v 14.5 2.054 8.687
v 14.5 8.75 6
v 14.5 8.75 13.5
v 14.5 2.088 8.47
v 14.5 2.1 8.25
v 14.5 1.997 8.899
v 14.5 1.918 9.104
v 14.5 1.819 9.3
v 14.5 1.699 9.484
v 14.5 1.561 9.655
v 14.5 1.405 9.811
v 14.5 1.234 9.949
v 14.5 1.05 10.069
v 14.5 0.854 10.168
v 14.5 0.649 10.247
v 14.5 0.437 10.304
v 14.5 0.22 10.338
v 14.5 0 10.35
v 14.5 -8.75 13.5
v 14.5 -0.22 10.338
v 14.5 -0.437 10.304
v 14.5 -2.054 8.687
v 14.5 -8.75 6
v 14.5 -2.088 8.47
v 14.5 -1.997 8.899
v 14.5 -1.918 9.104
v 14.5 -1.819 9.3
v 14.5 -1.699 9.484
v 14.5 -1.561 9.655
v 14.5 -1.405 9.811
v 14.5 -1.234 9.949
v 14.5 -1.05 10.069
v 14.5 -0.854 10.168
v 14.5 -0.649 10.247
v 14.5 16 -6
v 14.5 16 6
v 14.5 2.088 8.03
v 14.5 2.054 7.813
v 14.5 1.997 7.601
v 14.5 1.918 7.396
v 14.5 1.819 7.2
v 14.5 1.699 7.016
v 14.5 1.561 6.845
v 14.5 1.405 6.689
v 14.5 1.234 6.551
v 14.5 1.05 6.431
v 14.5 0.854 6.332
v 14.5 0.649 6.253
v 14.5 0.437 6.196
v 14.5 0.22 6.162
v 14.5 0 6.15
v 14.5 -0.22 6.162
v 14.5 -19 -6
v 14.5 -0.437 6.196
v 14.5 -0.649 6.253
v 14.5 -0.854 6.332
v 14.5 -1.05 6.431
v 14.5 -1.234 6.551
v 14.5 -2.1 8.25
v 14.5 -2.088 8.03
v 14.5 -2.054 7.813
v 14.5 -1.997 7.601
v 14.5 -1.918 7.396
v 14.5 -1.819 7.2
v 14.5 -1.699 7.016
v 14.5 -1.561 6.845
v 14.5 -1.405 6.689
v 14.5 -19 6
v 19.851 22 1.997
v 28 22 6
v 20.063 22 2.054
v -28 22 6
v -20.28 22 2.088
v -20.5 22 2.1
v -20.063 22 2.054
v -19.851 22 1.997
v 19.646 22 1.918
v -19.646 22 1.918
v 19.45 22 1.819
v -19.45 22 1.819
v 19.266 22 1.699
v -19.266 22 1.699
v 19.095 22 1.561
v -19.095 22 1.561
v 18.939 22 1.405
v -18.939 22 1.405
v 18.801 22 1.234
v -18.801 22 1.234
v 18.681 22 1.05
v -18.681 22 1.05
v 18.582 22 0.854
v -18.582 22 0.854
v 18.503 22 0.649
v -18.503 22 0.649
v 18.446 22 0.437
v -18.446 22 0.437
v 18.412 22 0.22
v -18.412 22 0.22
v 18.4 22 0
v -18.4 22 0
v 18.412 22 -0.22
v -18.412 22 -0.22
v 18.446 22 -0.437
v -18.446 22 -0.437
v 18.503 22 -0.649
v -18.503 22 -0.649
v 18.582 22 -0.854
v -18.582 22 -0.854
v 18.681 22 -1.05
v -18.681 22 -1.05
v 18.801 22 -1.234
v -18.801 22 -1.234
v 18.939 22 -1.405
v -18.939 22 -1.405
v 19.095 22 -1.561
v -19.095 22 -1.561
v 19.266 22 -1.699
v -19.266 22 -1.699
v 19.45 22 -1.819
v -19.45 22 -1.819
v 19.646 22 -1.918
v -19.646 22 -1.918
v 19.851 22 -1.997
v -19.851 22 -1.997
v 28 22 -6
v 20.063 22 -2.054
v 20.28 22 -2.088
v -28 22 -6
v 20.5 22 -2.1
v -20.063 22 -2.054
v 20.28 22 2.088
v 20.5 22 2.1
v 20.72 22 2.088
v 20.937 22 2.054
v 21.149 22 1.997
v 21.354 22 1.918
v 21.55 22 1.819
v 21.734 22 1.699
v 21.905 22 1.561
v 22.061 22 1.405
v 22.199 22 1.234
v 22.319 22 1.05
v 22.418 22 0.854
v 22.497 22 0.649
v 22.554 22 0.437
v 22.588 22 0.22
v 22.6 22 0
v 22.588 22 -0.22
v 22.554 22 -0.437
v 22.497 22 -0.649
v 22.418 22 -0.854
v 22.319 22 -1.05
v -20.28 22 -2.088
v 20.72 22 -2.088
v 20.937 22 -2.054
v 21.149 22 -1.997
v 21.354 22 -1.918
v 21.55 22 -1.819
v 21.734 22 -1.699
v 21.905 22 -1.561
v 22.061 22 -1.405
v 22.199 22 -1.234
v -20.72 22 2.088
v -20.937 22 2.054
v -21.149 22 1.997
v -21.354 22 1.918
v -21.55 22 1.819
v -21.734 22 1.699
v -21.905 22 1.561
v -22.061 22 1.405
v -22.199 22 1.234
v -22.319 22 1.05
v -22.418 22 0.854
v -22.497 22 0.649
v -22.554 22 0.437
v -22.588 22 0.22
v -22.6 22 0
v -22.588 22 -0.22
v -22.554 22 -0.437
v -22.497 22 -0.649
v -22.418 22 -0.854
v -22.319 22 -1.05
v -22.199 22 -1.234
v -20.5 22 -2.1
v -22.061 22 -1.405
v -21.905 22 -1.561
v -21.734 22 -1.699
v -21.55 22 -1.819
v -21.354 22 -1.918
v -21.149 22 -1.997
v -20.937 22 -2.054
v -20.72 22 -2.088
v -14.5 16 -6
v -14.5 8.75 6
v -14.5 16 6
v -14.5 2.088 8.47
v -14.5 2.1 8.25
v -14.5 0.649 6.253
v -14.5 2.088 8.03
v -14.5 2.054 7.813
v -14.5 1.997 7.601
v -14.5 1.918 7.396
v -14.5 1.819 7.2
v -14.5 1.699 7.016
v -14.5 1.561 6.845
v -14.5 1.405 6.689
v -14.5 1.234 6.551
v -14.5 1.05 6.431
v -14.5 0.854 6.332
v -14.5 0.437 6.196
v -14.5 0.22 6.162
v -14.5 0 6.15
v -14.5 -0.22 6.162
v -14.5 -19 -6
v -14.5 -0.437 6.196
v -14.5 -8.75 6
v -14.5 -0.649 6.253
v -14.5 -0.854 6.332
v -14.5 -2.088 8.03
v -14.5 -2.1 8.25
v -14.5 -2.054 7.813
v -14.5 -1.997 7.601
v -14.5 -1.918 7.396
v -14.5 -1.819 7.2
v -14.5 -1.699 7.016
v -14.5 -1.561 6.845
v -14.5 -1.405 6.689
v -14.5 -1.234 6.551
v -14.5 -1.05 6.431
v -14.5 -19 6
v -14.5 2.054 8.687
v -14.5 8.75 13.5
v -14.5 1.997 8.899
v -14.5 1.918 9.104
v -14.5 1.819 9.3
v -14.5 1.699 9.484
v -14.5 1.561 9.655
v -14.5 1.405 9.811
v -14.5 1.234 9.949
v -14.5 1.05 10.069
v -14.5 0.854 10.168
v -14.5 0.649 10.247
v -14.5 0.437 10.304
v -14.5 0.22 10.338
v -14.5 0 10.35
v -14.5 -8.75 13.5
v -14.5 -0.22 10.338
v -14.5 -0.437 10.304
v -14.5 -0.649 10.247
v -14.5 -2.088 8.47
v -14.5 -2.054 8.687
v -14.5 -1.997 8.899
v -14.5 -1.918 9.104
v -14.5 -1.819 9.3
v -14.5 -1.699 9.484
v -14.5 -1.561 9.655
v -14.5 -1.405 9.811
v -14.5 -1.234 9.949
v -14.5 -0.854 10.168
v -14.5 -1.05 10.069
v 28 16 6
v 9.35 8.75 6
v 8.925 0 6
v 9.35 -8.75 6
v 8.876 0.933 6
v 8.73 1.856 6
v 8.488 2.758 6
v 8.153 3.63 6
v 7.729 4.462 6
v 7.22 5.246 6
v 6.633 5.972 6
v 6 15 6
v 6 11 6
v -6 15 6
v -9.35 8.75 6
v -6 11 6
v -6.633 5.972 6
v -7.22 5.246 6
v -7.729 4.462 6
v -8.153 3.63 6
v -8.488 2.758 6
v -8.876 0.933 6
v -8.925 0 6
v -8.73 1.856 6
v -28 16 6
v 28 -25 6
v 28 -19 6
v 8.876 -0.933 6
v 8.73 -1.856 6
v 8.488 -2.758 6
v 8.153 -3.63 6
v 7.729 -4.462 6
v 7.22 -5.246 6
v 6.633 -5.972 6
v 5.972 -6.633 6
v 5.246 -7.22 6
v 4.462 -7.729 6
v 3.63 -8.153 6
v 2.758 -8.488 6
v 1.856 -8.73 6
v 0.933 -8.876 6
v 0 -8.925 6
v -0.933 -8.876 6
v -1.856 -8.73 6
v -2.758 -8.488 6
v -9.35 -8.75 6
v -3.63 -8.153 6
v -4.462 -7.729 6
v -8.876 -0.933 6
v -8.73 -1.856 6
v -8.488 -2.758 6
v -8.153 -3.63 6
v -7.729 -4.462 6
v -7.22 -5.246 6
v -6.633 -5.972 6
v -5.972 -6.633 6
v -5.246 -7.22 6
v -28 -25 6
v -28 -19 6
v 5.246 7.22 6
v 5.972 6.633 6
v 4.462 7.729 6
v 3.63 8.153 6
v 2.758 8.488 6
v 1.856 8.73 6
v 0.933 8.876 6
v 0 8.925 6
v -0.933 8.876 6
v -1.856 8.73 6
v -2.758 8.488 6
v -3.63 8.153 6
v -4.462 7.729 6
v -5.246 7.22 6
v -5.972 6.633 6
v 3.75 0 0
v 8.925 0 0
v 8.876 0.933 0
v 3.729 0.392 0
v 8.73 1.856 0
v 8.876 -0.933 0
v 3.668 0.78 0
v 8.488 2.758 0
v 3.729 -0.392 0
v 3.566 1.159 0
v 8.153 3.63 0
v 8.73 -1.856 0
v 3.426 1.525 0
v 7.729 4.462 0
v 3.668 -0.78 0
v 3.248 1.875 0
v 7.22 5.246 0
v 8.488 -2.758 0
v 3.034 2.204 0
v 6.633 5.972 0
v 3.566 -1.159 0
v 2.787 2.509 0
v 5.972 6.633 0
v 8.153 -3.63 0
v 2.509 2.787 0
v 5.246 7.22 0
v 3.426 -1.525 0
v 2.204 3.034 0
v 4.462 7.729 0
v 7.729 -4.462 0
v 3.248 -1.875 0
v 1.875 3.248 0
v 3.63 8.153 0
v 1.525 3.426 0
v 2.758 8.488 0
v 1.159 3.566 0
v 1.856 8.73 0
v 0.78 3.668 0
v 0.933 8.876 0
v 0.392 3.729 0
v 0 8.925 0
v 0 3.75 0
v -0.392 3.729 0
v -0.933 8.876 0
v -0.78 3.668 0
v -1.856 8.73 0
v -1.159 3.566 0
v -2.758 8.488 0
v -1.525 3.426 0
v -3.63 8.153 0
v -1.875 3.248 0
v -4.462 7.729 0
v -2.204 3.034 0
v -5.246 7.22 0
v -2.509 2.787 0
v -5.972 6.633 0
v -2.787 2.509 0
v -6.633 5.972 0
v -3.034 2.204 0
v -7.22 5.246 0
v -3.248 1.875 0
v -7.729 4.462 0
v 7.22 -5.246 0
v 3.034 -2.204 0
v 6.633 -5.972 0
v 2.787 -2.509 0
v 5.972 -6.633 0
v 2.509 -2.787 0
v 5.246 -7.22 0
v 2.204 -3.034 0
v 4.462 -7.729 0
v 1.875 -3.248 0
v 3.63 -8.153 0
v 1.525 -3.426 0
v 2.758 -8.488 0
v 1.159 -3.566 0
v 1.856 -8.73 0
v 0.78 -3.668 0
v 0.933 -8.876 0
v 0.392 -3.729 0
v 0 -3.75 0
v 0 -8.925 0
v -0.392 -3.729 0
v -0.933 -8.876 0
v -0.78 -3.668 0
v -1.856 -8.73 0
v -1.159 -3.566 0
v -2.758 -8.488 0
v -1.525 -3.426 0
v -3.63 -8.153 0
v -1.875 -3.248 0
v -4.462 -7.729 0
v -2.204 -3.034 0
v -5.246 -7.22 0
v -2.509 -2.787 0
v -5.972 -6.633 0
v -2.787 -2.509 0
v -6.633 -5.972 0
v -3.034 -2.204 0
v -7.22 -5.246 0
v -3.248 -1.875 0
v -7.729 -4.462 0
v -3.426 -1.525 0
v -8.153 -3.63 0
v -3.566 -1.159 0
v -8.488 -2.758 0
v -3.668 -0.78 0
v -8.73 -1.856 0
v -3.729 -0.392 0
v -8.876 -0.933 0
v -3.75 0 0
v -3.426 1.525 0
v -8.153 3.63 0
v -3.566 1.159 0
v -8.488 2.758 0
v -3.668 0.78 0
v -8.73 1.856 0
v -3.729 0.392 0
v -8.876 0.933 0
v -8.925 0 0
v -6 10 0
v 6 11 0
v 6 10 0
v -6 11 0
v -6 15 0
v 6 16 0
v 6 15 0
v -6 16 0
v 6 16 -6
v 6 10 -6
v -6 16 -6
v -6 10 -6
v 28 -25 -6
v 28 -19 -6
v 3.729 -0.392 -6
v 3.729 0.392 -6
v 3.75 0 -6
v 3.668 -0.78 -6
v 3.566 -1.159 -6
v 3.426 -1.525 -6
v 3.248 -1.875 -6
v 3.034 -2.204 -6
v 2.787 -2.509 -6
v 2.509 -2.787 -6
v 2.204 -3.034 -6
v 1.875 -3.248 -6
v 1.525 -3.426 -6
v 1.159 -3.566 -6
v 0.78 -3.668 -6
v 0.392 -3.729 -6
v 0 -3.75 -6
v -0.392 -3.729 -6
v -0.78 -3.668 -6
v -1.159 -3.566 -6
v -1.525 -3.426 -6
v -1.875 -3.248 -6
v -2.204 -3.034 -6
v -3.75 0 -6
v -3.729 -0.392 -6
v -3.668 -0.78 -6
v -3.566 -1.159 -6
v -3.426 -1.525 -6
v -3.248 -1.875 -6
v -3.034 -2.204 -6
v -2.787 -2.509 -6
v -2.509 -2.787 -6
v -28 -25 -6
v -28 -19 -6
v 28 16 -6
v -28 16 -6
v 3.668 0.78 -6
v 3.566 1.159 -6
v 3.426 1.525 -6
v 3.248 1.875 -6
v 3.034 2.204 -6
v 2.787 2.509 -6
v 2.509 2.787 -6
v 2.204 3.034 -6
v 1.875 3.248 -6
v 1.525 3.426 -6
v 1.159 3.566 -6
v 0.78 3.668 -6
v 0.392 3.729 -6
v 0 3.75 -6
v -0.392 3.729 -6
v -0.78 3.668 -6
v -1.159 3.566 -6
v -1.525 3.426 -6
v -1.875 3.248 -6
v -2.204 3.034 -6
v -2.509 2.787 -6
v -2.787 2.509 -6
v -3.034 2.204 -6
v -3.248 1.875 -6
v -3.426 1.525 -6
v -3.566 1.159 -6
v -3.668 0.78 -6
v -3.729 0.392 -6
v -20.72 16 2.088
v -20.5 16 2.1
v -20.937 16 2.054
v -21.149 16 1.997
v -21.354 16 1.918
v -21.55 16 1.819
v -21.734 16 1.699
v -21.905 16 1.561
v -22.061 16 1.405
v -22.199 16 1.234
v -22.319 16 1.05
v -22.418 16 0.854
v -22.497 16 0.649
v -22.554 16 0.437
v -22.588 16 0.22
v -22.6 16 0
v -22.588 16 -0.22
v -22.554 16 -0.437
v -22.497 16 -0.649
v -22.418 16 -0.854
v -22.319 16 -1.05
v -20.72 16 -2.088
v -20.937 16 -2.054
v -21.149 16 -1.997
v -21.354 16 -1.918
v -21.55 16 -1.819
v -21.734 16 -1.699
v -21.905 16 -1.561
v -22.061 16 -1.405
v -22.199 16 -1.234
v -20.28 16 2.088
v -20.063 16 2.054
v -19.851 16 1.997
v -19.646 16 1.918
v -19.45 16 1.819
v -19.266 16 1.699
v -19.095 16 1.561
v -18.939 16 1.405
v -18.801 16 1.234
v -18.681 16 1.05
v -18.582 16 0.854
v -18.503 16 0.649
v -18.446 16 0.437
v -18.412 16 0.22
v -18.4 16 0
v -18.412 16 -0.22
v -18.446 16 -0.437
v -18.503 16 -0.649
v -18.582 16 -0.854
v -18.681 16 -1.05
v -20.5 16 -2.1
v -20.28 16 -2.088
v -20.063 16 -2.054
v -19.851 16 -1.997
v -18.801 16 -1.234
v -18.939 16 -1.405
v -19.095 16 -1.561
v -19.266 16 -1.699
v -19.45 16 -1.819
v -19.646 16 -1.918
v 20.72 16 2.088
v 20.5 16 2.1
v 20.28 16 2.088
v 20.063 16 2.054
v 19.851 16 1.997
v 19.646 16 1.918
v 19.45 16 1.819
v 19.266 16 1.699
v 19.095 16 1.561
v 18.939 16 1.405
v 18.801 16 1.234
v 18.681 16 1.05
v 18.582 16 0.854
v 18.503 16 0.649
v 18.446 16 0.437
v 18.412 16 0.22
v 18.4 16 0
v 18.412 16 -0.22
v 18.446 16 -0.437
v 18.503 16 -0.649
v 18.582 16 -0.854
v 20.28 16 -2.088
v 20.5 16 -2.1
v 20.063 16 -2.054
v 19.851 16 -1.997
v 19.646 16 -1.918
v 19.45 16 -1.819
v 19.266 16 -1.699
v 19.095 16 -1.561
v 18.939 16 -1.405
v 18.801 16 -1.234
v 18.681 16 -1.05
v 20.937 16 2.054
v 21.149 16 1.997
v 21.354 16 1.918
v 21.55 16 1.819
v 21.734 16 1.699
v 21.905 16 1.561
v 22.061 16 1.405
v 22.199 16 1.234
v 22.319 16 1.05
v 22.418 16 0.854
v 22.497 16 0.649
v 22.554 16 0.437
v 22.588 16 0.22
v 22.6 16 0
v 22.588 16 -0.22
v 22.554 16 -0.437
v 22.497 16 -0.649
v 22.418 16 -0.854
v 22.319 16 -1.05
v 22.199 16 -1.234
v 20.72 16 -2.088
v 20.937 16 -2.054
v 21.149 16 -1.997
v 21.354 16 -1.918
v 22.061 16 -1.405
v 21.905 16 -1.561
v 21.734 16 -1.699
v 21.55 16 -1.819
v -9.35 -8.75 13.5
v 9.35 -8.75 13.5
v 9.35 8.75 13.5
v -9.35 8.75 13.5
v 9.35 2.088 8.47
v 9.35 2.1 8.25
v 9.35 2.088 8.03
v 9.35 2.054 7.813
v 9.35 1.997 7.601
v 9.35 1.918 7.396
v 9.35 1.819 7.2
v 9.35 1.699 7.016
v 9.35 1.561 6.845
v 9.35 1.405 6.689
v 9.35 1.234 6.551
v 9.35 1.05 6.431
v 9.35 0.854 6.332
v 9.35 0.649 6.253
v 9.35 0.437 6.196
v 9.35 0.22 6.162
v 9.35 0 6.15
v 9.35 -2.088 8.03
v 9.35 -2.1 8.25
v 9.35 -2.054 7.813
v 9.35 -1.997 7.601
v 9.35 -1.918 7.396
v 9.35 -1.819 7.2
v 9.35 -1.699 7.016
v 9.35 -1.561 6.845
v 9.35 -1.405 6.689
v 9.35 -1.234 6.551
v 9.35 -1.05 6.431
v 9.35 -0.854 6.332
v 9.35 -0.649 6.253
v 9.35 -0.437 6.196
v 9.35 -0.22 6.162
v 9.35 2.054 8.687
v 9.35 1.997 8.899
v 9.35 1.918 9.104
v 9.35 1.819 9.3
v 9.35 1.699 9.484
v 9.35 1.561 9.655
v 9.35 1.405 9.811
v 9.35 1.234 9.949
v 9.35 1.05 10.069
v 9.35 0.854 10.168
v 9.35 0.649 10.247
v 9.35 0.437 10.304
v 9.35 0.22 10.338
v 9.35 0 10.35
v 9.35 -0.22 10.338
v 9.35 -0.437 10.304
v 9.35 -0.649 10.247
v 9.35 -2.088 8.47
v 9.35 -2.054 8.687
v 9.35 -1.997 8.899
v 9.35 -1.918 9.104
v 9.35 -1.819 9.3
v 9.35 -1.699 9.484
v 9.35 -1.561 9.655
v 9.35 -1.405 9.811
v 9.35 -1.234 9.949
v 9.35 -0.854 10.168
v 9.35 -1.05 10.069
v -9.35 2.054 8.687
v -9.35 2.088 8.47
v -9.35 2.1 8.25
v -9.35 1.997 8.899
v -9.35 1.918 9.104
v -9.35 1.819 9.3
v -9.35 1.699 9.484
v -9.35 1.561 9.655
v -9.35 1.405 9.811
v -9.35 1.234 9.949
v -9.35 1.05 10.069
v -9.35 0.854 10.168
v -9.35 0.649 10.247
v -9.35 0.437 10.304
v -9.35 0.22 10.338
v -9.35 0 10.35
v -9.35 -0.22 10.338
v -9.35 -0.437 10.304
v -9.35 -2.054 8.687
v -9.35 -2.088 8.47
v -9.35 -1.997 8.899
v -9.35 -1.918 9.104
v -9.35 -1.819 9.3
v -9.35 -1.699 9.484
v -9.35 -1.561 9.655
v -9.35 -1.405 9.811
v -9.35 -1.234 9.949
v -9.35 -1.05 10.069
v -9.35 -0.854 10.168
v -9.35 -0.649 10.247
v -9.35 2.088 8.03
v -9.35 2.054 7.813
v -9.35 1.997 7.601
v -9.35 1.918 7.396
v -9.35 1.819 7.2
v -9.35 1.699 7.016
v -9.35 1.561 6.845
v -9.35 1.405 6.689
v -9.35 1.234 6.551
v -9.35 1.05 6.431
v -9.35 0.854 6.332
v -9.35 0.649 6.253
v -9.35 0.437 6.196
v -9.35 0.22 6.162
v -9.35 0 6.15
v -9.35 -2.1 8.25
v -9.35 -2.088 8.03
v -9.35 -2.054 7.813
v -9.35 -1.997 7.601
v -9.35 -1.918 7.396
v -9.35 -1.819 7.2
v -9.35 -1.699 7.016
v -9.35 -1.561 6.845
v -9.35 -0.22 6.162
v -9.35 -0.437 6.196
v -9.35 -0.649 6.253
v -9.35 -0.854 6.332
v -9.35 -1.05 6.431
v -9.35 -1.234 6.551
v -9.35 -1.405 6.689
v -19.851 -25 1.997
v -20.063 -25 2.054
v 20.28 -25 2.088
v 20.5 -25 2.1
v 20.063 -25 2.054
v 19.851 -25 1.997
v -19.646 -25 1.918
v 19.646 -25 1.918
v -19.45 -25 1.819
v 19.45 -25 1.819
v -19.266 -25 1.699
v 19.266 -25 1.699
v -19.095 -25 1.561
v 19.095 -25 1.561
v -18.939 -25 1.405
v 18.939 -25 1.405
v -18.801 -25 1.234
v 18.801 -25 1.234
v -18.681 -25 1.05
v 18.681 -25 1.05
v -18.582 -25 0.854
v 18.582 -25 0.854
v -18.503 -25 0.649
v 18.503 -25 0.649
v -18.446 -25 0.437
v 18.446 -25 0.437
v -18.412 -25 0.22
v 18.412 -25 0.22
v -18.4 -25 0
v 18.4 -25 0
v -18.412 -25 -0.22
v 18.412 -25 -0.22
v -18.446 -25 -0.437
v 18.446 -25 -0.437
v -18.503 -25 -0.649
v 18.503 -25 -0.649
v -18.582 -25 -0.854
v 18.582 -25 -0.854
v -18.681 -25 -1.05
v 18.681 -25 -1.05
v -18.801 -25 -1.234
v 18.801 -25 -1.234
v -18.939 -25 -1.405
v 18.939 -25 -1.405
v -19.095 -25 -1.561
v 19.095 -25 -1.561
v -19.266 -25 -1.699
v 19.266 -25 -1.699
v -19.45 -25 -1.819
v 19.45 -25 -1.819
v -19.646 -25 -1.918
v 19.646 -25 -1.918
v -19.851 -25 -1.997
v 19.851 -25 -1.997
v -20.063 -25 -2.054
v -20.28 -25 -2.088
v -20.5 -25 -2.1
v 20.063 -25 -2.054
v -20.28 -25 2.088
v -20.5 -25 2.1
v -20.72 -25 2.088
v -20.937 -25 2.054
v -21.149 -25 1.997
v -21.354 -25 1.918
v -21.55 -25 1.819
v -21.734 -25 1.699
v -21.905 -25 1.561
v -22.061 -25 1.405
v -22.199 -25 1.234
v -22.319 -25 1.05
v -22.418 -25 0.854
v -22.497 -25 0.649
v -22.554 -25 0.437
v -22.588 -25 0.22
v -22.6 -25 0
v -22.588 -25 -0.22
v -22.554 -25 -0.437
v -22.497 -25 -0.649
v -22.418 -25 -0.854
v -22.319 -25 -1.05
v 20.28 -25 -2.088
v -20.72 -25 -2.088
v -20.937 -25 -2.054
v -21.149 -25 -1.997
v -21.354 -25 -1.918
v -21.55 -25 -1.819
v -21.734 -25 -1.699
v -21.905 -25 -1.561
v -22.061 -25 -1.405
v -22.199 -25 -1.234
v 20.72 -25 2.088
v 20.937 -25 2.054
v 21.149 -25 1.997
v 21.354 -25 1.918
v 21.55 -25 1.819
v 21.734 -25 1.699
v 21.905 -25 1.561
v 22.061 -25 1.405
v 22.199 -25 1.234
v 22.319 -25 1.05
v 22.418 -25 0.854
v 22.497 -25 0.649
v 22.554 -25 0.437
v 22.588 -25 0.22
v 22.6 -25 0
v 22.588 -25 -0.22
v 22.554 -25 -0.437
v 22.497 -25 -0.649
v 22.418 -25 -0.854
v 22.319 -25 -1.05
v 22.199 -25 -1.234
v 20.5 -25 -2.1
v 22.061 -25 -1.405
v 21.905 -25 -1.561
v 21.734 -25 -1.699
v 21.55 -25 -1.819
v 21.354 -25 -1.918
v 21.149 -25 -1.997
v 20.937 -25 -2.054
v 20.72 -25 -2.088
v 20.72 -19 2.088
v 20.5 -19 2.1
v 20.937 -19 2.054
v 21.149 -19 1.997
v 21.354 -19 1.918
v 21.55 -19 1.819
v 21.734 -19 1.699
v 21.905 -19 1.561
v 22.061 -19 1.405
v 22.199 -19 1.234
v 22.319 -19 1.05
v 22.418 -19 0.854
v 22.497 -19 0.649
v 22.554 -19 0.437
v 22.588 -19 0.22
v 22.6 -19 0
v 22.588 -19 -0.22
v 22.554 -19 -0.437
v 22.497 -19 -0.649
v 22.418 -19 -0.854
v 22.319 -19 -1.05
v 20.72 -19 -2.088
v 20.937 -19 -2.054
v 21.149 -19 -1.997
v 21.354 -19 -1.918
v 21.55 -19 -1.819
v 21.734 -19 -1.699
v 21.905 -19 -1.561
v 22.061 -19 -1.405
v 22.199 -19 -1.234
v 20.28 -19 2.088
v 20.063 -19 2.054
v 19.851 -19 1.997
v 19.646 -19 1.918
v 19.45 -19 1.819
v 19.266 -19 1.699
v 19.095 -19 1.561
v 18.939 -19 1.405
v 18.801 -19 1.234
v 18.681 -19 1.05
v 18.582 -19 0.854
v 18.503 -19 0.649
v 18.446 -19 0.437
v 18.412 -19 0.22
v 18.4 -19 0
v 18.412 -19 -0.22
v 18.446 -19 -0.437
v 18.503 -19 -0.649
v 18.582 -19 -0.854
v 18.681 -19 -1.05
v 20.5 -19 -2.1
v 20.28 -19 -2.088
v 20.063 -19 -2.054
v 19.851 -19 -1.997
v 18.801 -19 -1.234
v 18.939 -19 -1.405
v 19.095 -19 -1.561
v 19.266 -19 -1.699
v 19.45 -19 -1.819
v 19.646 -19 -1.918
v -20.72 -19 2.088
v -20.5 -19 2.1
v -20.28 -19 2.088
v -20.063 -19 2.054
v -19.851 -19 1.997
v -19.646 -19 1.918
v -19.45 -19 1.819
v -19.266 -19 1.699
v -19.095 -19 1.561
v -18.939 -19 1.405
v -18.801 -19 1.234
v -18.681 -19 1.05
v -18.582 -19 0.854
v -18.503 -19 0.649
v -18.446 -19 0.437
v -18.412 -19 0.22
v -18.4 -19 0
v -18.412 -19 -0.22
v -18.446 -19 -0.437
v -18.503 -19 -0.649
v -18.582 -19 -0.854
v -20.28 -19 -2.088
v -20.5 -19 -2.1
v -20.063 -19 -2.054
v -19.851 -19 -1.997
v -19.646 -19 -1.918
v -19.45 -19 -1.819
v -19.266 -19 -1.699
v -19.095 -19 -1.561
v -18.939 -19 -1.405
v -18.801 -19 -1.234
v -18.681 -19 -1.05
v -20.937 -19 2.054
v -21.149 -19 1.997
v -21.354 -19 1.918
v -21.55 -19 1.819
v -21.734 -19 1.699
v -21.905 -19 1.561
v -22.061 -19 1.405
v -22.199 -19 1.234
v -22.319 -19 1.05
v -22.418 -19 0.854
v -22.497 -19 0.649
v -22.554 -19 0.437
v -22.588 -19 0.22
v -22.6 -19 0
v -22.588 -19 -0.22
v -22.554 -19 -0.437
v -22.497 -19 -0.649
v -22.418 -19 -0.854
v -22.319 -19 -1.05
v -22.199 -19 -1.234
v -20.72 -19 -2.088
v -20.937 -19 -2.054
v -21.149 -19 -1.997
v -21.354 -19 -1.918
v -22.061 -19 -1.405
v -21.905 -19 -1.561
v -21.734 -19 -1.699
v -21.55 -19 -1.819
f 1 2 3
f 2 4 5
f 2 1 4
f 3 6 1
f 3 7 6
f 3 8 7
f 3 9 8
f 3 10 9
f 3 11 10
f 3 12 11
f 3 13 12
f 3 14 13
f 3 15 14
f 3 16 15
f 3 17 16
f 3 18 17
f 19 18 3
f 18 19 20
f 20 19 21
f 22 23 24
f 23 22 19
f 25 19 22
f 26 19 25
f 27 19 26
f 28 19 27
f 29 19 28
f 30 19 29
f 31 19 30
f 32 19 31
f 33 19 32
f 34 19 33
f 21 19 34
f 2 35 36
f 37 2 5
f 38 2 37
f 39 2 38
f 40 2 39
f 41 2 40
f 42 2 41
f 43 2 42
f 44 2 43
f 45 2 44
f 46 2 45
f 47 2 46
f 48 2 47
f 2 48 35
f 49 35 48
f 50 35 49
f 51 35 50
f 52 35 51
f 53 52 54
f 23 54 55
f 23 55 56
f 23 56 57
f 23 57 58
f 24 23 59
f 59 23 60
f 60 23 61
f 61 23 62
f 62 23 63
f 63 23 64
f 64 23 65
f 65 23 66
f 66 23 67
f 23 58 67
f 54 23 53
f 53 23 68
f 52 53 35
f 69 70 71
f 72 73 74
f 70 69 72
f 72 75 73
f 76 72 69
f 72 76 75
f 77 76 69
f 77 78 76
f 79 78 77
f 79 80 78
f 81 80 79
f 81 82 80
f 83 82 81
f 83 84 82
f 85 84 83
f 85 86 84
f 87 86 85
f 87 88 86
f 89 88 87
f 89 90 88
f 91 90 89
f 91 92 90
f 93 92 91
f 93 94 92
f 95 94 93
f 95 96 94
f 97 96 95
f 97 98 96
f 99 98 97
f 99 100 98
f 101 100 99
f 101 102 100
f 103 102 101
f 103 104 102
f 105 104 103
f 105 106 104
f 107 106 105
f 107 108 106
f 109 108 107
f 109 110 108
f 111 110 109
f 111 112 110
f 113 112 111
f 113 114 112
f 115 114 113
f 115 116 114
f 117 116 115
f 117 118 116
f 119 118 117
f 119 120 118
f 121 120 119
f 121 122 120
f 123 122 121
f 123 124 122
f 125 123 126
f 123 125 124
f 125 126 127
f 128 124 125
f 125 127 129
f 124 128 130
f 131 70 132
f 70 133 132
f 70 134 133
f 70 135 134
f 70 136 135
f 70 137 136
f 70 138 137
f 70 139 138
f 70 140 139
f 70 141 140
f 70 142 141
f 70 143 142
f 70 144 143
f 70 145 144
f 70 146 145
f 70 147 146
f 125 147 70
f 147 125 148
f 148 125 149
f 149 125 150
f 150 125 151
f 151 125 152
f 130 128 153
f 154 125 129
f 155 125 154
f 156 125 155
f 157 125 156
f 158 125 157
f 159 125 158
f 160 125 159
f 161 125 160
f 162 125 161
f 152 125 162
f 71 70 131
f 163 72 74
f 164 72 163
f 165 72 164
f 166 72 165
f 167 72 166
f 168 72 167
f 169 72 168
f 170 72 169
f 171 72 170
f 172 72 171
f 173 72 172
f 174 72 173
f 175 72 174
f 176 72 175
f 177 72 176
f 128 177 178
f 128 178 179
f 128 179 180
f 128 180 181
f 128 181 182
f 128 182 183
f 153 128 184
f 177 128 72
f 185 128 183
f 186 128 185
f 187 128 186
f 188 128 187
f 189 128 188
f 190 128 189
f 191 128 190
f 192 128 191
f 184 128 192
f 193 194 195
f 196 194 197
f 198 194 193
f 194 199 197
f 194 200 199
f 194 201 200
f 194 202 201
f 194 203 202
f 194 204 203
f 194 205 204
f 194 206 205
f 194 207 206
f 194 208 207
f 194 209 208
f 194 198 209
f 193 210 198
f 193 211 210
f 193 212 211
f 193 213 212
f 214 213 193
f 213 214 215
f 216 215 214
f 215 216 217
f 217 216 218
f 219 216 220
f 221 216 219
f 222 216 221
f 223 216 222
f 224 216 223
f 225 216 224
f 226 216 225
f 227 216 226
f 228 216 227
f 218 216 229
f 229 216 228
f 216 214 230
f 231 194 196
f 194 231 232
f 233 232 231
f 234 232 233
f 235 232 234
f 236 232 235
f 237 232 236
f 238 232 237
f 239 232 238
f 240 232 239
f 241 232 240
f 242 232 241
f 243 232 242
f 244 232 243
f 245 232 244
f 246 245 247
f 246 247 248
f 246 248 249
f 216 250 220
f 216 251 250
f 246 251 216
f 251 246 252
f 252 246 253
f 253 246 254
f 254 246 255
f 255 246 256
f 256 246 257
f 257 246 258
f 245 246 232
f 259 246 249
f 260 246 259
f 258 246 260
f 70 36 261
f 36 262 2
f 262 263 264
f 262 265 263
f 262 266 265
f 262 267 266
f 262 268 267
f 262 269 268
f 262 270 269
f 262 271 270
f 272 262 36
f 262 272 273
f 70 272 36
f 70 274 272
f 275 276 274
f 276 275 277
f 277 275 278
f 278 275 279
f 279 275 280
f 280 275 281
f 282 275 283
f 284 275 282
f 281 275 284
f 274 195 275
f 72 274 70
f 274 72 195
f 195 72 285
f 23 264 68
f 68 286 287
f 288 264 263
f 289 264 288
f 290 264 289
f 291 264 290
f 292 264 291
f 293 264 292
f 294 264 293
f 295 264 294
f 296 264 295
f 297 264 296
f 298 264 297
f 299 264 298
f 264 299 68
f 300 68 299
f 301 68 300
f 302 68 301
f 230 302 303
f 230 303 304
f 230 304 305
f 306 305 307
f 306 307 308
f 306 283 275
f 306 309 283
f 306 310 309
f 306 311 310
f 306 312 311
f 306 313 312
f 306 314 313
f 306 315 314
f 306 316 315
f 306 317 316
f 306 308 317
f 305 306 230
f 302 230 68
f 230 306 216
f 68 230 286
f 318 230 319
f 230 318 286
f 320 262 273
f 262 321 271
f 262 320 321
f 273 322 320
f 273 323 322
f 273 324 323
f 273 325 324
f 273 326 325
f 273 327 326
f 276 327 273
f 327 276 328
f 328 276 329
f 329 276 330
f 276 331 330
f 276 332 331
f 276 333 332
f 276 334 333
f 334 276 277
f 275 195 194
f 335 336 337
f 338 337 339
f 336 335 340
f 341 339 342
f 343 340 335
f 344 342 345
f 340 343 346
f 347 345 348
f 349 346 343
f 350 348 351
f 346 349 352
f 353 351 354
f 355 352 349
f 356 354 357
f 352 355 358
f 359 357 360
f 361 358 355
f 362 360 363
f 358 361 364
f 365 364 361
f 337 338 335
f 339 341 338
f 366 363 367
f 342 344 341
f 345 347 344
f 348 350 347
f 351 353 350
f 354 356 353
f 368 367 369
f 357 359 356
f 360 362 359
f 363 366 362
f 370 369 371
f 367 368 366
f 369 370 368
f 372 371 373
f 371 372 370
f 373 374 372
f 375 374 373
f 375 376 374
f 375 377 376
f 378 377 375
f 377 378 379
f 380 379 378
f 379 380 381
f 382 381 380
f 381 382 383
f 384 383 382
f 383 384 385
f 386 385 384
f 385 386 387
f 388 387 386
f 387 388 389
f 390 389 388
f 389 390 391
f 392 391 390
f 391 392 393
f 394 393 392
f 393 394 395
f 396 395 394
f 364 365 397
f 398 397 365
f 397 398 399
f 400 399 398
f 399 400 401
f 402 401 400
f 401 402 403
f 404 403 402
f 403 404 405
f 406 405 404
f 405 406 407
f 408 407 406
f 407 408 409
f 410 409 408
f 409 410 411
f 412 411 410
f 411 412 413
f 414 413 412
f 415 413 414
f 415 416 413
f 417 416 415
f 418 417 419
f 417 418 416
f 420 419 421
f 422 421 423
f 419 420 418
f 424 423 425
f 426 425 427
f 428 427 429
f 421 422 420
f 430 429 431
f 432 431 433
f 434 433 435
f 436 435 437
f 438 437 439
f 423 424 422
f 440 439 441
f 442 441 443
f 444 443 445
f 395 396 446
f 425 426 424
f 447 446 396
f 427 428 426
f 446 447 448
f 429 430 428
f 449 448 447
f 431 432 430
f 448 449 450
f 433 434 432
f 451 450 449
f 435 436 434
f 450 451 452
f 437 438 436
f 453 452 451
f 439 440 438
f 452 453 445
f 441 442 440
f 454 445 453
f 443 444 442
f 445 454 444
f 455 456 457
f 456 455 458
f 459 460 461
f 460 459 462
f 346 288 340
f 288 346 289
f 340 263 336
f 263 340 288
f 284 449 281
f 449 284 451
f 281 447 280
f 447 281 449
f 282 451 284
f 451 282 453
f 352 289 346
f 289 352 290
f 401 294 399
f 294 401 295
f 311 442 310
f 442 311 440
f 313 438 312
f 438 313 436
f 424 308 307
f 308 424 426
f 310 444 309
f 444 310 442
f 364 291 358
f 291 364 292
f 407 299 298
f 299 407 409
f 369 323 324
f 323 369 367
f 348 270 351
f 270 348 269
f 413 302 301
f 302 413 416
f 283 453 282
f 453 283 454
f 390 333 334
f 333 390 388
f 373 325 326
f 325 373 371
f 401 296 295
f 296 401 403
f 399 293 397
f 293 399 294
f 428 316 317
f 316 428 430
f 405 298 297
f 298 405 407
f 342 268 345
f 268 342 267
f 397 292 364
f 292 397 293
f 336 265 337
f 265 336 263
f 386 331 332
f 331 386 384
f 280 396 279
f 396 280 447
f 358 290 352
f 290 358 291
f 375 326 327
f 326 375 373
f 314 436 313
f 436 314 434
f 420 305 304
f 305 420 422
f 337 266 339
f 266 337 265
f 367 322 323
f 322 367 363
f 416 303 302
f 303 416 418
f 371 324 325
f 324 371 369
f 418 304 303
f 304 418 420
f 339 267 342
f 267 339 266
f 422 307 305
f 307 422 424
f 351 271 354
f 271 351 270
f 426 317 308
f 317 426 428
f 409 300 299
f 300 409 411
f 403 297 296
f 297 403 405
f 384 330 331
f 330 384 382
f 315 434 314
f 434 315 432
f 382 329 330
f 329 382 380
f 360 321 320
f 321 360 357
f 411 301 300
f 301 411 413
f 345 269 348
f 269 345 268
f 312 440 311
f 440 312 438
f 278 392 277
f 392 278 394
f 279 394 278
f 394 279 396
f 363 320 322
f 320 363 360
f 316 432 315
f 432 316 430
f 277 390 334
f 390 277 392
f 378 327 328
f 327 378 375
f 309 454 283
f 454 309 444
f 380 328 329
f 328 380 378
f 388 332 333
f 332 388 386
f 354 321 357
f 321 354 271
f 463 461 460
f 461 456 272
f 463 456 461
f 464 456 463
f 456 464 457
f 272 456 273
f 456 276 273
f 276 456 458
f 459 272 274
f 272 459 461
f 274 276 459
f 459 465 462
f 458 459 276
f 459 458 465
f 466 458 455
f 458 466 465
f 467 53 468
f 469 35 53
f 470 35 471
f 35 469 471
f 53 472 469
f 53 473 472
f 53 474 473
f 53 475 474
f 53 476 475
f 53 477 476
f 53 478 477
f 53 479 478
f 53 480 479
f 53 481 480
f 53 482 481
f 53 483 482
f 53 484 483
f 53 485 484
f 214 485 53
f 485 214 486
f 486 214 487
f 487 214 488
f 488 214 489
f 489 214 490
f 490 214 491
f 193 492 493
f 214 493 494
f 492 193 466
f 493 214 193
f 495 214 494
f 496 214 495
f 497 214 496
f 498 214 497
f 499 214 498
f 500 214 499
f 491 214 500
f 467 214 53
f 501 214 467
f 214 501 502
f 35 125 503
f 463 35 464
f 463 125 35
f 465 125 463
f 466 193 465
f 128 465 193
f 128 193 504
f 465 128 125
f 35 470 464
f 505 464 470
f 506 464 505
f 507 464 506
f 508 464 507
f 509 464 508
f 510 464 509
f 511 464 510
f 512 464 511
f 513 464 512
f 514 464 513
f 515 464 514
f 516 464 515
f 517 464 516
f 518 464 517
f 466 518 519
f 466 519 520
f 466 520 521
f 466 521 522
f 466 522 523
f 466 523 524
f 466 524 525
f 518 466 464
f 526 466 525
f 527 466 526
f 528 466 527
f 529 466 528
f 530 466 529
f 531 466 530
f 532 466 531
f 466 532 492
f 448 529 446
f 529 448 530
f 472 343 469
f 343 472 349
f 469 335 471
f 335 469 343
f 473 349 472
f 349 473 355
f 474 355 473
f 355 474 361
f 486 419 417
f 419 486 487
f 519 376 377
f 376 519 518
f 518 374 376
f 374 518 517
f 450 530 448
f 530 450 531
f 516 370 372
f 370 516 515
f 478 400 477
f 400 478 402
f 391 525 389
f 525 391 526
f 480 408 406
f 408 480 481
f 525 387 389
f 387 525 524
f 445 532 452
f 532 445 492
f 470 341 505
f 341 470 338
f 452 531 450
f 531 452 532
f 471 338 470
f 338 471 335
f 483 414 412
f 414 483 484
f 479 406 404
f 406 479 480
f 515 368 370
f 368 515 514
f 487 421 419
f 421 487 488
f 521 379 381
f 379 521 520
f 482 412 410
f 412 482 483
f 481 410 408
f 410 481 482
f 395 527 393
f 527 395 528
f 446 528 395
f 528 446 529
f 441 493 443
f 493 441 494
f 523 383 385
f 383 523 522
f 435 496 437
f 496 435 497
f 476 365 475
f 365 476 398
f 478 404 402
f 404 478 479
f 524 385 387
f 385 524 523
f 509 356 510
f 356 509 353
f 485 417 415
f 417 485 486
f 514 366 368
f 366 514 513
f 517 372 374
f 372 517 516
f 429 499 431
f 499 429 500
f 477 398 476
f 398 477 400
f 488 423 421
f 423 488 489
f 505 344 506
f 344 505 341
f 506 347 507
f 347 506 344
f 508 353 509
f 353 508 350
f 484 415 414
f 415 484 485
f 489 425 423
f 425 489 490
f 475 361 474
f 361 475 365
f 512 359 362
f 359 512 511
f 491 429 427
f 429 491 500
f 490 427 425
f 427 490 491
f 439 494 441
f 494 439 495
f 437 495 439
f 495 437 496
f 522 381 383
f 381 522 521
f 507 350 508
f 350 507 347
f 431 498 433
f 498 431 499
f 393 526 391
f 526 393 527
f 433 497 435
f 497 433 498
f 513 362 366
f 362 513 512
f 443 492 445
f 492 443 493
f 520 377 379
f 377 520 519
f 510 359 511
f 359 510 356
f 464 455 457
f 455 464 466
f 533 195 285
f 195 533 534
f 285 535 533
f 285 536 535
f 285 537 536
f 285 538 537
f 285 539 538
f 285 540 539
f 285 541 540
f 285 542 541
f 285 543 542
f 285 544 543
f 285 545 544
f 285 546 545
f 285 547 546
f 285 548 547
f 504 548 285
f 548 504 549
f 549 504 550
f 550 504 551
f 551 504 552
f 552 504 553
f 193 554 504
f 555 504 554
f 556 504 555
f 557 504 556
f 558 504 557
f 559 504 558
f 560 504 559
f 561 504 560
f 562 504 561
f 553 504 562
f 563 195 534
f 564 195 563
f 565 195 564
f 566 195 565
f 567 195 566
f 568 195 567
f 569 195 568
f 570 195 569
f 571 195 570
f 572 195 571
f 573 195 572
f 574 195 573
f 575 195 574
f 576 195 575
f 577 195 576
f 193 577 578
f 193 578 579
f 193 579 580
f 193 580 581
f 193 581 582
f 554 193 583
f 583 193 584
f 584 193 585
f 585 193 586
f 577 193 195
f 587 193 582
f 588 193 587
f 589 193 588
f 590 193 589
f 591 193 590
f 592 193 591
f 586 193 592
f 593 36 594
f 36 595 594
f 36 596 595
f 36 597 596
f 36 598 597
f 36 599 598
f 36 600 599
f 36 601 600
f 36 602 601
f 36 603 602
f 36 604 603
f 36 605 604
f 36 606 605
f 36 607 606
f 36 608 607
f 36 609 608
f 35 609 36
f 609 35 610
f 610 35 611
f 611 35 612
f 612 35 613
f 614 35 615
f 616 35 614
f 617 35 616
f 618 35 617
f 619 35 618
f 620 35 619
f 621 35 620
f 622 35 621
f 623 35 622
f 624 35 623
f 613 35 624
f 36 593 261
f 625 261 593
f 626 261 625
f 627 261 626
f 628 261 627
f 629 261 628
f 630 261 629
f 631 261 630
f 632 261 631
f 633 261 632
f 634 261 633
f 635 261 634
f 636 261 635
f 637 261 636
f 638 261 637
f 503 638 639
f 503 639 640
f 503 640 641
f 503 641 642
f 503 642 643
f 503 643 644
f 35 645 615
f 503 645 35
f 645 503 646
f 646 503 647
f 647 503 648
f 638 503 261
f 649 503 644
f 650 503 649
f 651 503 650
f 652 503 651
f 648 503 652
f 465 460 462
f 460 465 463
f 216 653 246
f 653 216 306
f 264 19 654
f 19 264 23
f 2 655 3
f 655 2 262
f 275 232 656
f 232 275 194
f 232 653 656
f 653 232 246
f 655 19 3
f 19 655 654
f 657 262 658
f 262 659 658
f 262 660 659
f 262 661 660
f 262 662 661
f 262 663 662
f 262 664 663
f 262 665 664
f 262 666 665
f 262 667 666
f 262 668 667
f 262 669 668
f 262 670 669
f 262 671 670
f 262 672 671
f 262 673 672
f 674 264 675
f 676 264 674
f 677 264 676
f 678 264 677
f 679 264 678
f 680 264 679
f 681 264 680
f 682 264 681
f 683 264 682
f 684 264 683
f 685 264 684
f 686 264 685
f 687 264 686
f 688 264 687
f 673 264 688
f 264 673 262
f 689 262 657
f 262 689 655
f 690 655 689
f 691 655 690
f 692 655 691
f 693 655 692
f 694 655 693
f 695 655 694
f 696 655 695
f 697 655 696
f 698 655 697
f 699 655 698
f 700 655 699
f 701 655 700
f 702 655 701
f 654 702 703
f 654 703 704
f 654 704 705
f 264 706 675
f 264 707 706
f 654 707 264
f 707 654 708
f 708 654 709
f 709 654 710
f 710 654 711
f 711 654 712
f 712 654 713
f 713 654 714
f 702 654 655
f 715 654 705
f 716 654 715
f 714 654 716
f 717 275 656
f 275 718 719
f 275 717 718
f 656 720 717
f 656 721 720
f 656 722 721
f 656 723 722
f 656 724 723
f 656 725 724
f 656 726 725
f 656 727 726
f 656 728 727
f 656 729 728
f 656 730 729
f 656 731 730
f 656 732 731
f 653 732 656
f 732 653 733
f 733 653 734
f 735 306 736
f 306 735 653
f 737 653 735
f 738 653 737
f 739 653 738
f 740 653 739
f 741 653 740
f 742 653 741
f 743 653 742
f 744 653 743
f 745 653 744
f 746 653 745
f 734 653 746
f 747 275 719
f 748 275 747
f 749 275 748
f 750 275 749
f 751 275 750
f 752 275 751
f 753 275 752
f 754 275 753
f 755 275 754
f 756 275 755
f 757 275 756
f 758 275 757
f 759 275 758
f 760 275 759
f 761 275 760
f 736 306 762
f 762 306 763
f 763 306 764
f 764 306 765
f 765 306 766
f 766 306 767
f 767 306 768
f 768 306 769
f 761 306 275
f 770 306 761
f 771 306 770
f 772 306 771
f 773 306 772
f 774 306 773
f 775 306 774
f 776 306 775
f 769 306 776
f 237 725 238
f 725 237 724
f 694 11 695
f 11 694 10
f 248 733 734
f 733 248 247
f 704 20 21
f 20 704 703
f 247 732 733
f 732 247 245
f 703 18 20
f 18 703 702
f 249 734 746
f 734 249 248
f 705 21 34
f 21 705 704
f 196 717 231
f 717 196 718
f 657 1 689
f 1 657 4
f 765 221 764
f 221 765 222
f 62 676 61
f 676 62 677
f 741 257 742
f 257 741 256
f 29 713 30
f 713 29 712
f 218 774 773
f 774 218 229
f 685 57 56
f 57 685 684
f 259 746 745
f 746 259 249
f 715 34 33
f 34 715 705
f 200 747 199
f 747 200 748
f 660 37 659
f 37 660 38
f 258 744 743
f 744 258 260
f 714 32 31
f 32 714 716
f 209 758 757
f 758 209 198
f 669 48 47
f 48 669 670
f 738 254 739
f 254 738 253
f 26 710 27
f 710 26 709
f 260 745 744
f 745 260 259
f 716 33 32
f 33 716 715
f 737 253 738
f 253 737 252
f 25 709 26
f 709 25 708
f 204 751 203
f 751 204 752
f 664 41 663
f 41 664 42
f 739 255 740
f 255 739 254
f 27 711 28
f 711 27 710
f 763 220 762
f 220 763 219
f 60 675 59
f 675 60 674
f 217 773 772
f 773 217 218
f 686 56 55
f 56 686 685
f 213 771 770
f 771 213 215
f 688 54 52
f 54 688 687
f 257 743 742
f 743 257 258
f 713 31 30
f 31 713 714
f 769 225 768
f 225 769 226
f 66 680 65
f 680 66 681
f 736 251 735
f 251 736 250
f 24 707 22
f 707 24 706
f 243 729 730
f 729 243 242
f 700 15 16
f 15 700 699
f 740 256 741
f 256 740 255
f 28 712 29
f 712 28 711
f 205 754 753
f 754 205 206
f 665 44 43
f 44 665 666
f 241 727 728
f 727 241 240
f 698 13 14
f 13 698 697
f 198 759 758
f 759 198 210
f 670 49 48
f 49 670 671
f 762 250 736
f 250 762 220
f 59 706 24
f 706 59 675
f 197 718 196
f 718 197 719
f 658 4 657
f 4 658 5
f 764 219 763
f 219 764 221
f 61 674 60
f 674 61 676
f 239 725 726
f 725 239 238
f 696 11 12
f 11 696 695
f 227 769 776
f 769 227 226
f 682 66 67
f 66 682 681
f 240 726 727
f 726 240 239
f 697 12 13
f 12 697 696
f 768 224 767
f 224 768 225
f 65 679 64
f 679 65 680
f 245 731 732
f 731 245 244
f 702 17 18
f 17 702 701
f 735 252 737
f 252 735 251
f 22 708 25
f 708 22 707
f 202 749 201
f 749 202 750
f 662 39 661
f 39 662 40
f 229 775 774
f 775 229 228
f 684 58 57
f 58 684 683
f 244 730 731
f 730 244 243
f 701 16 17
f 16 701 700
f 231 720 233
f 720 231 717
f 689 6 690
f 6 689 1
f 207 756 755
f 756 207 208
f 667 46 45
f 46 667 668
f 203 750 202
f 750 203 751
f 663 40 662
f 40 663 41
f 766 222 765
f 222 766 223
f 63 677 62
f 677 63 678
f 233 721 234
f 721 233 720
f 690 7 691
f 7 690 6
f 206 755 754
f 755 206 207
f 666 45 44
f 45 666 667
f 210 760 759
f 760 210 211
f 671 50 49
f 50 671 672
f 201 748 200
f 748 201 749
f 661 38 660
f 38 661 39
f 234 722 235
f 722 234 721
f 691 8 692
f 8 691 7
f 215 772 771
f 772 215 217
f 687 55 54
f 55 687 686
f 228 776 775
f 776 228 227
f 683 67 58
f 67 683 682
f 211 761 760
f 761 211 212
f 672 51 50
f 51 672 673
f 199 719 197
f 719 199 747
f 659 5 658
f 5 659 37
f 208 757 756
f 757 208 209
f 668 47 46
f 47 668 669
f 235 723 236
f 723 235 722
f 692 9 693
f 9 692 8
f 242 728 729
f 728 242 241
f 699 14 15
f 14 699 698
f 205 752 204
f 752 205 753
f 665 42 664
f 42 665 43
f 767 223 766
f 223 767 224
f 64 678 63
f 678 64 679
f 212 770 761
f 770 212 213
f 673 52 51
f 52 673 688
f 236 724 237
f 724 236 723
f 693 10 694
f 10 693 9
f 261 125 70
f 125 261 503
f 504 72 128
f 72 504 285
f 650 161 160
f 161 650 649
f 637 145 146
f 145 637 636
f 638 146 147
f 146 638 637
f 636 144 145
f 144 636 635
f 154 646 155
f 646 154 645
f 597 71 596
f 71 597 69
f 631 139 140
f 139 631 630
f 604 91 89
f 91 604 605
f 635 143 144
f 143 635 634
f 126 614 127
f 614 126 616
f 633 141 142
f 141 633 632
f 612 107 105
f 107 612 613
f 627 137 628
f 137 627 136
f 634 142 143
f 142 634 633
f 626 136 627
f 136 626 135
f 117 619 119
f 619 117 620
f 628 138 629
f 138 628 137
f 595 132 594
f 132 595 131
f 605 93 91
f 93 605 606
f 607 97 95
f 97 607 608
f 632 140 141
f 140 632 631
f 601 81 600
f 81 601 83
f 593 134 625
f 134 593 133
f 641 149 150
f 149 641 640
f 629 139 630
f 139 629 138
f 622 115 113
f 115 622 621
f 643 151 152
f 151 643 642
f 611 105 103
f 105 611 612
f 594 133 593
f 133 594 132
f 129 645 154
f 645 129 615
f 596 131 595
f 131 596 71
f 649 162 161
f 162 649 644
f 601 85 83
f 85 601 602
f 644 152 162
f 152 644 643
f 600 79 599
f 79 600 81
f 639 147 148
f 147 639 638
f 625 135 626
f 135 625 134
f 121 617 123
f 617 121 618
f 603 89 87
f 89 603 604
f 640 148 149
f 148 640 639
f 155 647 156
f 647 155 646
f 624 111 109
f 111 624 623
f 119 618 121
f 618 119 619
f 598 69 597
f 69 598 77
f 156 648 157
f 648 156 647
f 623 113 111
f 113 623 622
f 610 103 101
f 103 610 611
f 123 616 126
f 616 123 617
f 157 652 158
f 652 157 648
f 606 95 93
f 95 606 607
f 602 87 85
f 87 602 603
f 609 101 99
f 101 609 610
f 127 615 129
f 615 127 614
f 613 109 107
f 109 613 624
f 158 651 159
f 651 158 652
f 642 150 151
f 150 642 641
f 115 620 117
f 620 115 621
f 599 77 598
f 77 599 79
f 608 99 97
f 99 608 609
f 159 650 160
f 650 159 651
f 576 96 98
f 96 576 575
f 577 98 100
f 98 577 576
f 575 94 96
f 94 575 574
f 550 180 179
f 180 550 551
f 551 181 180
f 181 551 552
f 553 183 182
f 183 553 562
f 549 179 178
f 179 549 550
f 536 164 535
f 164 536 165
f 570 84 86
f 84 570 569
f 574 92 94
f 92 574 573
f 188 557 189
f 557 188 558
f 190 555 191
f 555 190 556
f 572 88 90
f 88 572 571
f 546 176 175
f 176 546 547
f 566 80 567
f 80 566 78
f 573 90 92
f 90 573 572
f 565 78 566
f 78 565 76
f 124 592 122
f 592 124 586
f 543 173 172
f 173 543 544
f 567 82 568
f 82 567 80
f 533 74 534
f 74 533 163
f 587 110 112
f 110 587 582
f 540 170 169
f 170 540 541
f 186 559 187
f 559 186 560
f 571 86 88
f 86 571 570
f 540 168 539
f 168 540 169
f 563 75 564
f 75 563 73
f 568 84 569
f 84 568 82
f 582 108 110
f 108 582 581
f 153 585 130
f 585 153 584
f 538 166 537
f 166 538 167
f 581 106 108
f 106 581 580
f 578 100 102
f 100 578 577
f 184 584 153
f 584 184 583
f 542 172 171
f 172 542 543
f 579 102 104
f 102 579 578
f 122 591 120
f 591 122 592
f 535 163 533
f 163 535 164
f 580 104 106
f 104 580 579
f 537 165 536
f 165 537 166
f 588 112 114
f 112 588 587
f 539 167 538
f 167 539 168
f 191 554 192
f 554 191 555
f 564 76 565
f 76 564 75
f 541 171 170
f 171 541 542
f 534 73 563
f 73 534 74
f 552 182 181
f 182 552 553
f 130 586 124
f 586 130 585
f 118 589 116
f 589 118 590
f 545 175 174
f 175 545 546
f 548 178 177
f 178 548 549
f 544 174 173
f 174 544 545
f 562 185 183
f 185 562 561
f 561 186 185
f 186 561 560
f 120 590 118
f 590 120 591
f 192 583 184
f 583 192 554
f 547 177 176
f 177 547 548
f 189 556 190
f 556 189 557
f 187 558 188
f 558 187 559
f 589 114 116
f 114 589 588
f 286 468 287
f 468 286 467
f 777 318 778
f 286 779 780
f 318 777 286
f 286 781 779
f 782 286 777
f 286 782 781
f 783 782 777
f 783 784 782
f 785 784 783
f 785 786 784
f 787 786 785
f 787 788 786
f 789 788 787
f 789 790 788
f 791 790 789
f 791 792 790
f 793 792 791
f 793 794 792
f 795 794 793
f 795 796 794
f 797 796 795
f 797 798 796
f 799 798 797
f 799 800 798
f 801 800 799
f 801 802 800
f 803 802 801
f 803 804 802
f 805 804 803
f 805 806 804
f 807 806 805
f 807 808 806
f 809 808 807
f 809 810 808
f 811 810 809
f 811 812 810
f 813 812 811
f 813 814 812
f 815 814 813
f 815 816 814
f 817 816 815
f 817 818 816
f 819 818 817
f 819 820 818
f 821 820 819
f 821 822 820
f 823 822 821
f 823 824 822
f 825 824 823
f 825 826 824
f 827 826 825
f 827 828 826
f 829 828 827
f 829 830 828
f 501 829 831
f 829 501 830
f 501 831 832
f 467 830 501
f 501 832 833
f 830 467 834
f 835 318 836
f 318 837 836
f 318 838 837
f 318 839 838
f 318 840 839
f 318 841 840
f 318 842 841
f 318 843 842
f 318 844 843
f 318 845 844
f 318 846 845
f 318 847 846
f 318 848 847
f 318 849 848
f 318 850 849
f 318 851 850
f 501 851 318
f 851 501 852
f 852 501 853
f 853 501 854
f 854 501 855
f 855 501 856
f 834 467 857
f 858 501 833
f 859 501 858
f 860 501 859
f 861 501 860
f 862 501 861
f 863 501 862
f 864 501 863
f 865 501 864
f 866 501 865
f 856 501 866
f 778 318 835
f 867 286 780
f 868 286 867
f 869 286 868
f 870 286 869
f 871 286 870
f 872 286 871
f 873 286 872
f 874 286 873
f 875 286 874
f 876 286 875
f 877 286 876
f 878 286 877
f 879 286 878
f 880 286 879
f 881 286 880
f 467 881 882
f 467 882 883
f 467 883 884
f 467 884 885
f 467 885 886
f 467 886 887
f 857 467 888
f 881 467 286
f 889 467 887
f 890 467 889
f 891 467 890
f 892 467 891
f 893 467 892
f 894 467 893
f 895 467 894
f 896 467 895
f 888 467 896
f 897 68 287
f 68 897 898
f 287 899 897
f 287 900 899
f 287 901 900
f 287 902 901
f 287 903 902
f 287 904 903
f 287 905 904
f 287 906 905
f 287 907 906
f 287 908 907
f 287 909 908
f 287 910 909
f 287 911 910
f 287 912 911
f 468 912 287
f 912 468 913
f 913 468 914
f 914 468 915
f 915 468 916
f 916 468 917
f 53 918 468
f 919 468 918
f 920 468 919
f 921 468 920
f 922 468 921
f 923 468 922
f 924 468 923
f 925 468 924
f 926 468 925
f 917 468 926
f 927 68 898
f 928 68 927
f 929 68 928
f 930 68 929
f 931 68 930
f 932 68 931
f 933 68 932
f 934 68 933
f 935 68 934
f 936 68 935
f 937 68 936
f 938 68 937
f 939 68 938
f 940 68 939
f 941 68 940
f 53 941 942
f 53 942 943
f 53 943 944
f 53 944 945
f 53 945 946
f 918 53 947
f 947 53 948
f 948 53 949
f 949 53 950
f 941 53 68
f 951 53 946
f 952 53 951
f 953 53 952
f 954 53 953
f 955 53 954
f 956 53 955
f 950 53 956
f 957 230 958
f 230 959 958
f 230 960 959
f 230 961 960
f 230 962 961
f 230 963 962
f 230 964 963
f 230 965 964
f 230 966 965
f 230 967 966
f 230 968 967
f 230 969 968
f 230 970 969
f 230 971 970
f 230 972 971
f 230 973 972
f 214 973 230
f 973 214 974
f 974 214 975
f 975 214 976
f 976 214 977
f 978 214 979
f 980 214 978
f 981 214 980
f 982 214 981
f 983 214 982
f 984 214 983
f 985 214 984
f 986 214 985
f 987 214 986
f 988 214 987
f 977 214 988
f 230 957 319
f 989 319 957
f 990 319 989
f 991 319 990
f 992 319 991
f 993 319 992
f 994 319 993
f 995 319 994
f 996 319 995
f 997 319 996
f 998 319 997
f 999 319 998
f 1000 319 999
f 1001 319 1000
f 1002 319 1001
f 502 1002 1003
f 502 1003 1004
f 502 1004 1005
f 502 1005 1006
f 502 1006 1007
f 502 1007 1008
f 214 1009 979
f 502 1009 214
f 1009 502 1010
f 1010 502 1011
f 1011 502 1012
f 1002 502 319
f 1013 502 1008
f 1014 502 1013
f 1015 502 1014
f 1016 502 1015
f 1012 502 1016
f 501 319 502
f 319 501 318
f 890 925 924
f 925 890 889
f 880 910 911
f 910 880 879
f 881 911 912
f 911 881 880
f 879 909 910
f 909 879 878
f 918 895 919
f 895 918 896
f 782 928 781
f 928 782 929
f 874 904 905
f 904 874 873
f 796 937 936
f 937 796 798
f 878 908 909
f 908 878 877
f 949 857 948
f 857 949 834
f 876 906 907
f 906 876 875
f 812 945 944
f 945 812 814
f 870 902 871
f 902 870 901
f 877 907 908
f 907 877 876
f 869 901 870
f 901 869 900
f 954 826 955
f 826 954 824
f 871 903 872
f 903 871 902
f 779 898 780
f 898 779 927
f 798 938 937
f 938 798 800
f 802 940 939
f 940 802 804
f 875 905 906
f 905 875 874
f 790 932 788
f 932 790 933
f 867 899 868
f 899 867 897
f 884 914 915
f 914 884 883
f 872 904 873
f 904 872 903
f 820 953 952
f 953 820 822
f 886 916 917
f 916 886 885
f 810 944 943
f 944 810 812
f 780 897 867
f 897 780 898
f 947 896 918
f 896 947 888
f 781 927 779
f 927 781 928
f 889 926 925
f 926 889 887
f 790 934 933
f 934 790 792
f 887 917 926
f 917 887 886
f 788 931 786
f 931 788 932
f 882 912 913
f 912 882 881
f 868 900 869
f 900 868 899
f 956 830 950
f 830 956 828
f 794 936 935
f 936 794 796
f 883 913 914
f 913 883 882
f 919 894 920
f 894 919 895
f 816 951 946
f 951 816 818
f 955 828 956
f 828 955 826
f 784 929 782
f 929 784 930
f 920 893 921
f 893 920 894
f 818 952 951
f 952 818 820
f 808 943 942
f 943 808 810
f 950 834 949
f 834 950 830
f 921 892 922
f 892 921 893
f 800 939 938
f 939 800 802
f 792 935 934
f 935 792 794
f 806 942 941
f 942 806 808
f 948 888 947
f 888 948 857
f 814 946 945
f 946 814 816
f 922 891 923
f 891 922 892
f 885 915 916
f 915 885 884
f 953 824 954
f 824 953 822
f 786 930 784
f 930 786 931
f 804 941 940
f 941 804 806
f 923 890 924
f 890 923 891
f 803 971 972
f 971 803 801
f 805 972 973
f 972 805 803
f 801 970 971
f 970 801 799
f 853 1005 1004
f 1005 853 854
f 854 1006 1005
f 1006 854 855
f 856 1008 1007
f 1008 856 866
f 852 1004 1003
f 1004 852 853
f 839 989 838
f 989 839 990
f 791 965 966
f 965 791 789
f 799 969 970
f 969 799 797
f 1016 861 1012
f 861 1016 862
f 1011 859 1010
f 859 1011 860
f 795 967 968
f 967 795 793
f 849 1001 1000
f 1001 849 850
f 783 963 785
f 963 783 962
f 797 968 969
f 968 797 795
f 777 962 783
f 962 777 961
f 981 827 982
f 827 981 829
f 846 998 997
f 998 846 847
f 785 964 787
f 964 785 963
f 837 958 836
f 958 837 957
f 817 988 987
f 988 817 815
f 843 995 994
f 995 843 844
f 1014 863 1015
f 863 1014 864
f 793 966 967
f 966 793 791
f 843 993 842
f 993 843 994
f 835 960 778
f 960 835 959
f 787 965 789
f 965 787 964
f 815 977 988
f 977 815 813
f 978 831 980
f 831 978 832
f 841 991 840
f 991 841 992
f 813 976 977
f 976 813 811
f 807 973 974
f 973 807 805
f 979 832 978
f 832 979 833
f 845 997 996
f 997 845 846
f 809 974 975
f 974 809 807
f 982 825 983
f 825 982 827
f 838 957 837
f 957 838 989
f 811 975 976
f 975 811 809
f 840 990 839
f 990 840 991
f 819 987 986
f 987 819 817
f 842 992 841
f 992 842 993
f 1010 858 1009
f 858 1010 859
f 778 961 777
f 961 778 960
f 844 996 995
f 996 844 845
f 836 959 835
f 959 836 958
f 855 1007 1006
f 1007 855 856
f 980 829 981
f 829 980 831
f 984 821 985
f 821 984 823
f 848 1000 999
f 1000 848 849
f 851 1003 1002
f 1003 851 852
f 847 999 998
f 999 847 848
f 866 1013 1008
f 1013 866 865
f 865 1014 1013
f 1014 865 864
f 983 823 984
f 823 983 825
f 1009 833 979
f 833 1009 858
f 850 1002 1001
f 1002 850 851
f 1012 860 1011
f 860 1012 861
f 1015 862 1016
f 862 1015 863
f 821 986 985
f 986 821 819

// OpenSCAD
// file: metal-parts.scad
$fn=60;
include <variables.scad>;

module treaded_rod(radius_tr = 6/2, length=300)
{
  color("DarkGray") 
  {
      rotate([90,0,0])  cylinder(h=length, r=radius_tr, center=true);
  }
}

module bearing()
{
  color("DarkGray") 
  {
    difference() 
    {
      rotate([90,0,0])  cylinder(h=bearing_t*1.05, r=bearing_os, center=true);  // 1.05 to make it render nice
      rotate([90,0,0])  cylinder(h=bearing_t*2, r=radius_tr, center=true);
    }
  }
}


treaded_rod();

!translate([0, radius_tr, ( bread_h)/2]) bearing();
// file: variables.scad
radius_tr = 6/2;
radius_bolt = 4/2;
bearing_os = 17/2;
bearing_t = 6;
bread_h = 15;
c_height = bearing_os*2+radius_tr*4;

$fn=60;

connector_width=(bearing_os+radius_tr*2+radius_bolt*6)*2;
connector_height=(bread_h+radius_tr*2+6)*2 ;
// main file
include <variables.scad>;
use <metal-parts.scad>;

module flat_sub_connector()
{

  difference()
  {
    cube([c_height+radius_tr*9, radius_tr*4, radius_tr*2], center=true);
    translate([(c_height+radius_tr*8)/2-radius_tr*2, 0, 0]) rotate([0,0,0]) cylinder(h=radius_tr*80, r=radius_bolt*1.05, center=true);
    translate([-(c_height+radius_tr*8)/2+radius_tr*2, 0, 0]) rotate([0,0,0]) cylinder(h=radius_tr*80, r=radius_bolt*1.05, center=true);
//     cube([c_height-radius_tr*1, radius_tr*8, radius_tr*4], center=true);
  }
}

module xConnector()
{

  translate([0, radius_tr, 0]) difference() 
  {
    cube([c_height, radius_tr*2, c_height + bread_h], center=true);
   translate([0, 0, 0]) rotate([90,0,0]) cylinder(h=radius_tr*8, r=bearing_os*1.05, center=true);
//    translate([0, 0, ( c_height + bread_h)/-2]) cube([c_height/2, radius_tr*4, (c_height + bread_h)/1.5], center=true);
    translate([0, 0, (c_height + bread_h)/-2+radius_tr*3]) cube([radius_tr*4, radius_tr*4, radius_bolt*2], center=true);

  }
  translate([0, -radius_tr, 0]) difference() 
  {
    cube([c_height, radius_tr*2, c_height + bread_h], center=true);
    translate([0, 0, 0]) rotate([90,0,0]) cylinder(h=radius_tr*8, r=radius_tr*1.25, center=true);
    translate([0, 0, (c_height + bread_h)/-2+radius_tr*3]) cube([radius_tr*4, radius_tr*4, radius_tr*2], center=true);
  }

  translate([0, radius_tr*2.25, 0]) difference() 
  {
    cube([c_height, radius_tr*4.5, (c_height+radius_tr*2)/2], center=true);
    cube([bearing_os*2.2, c_height+radius_tr*4, radius_tr*12], center=true);
   translate([0, radius_tr*0.5, 0]) rotate([90,0,90]) cylinder(h=radius_tr*12, r=radius_bolt*1.05, center=true);
  }
  translate([0, radius_tr*0, (c_height + bread_h)/-2+radius_tr*1]) 
  {
    flat_sub_connector();
  }

  translate([0, radius_tr*0, (c_height + bread_h)/+2])  
  {
    flat_sub_connector();
  }

}

module double_flat_sub_connector()
{
  flat_sub_connector();
  translate([0, 0, radius_tr*2]) flat_sub_connector();
}


module bearing_connect()
{
  difference()
  {
    double_flat_sub_connector();
    cube([bearing_os*2+radius_tr*4, radius_tr*6, radius_tr*4], center=true);
  }
  translate([0, 0, radius_tr*2.]) difference()
  {
    cube([bearing_os*2+radius_tr*5, radius_tr*4, radius_tr*2], center=true);
  }
  translate([0, 0, radius_tr*1])  cylinder(h=radius_tr*4, r=radius_tr*0.975, center=true);
}


module xConnector_wBearing()
{
  translate([0, radius_tr, ( bread_h)/2]) bearing();
  xConnector();
}

//xConnector_wBearing();

//rotate([0,180,0]) bearing_connect();
//rotate([90,0,0]) bearing();

//Printing
rotate([90,0,0])   xConnector();
